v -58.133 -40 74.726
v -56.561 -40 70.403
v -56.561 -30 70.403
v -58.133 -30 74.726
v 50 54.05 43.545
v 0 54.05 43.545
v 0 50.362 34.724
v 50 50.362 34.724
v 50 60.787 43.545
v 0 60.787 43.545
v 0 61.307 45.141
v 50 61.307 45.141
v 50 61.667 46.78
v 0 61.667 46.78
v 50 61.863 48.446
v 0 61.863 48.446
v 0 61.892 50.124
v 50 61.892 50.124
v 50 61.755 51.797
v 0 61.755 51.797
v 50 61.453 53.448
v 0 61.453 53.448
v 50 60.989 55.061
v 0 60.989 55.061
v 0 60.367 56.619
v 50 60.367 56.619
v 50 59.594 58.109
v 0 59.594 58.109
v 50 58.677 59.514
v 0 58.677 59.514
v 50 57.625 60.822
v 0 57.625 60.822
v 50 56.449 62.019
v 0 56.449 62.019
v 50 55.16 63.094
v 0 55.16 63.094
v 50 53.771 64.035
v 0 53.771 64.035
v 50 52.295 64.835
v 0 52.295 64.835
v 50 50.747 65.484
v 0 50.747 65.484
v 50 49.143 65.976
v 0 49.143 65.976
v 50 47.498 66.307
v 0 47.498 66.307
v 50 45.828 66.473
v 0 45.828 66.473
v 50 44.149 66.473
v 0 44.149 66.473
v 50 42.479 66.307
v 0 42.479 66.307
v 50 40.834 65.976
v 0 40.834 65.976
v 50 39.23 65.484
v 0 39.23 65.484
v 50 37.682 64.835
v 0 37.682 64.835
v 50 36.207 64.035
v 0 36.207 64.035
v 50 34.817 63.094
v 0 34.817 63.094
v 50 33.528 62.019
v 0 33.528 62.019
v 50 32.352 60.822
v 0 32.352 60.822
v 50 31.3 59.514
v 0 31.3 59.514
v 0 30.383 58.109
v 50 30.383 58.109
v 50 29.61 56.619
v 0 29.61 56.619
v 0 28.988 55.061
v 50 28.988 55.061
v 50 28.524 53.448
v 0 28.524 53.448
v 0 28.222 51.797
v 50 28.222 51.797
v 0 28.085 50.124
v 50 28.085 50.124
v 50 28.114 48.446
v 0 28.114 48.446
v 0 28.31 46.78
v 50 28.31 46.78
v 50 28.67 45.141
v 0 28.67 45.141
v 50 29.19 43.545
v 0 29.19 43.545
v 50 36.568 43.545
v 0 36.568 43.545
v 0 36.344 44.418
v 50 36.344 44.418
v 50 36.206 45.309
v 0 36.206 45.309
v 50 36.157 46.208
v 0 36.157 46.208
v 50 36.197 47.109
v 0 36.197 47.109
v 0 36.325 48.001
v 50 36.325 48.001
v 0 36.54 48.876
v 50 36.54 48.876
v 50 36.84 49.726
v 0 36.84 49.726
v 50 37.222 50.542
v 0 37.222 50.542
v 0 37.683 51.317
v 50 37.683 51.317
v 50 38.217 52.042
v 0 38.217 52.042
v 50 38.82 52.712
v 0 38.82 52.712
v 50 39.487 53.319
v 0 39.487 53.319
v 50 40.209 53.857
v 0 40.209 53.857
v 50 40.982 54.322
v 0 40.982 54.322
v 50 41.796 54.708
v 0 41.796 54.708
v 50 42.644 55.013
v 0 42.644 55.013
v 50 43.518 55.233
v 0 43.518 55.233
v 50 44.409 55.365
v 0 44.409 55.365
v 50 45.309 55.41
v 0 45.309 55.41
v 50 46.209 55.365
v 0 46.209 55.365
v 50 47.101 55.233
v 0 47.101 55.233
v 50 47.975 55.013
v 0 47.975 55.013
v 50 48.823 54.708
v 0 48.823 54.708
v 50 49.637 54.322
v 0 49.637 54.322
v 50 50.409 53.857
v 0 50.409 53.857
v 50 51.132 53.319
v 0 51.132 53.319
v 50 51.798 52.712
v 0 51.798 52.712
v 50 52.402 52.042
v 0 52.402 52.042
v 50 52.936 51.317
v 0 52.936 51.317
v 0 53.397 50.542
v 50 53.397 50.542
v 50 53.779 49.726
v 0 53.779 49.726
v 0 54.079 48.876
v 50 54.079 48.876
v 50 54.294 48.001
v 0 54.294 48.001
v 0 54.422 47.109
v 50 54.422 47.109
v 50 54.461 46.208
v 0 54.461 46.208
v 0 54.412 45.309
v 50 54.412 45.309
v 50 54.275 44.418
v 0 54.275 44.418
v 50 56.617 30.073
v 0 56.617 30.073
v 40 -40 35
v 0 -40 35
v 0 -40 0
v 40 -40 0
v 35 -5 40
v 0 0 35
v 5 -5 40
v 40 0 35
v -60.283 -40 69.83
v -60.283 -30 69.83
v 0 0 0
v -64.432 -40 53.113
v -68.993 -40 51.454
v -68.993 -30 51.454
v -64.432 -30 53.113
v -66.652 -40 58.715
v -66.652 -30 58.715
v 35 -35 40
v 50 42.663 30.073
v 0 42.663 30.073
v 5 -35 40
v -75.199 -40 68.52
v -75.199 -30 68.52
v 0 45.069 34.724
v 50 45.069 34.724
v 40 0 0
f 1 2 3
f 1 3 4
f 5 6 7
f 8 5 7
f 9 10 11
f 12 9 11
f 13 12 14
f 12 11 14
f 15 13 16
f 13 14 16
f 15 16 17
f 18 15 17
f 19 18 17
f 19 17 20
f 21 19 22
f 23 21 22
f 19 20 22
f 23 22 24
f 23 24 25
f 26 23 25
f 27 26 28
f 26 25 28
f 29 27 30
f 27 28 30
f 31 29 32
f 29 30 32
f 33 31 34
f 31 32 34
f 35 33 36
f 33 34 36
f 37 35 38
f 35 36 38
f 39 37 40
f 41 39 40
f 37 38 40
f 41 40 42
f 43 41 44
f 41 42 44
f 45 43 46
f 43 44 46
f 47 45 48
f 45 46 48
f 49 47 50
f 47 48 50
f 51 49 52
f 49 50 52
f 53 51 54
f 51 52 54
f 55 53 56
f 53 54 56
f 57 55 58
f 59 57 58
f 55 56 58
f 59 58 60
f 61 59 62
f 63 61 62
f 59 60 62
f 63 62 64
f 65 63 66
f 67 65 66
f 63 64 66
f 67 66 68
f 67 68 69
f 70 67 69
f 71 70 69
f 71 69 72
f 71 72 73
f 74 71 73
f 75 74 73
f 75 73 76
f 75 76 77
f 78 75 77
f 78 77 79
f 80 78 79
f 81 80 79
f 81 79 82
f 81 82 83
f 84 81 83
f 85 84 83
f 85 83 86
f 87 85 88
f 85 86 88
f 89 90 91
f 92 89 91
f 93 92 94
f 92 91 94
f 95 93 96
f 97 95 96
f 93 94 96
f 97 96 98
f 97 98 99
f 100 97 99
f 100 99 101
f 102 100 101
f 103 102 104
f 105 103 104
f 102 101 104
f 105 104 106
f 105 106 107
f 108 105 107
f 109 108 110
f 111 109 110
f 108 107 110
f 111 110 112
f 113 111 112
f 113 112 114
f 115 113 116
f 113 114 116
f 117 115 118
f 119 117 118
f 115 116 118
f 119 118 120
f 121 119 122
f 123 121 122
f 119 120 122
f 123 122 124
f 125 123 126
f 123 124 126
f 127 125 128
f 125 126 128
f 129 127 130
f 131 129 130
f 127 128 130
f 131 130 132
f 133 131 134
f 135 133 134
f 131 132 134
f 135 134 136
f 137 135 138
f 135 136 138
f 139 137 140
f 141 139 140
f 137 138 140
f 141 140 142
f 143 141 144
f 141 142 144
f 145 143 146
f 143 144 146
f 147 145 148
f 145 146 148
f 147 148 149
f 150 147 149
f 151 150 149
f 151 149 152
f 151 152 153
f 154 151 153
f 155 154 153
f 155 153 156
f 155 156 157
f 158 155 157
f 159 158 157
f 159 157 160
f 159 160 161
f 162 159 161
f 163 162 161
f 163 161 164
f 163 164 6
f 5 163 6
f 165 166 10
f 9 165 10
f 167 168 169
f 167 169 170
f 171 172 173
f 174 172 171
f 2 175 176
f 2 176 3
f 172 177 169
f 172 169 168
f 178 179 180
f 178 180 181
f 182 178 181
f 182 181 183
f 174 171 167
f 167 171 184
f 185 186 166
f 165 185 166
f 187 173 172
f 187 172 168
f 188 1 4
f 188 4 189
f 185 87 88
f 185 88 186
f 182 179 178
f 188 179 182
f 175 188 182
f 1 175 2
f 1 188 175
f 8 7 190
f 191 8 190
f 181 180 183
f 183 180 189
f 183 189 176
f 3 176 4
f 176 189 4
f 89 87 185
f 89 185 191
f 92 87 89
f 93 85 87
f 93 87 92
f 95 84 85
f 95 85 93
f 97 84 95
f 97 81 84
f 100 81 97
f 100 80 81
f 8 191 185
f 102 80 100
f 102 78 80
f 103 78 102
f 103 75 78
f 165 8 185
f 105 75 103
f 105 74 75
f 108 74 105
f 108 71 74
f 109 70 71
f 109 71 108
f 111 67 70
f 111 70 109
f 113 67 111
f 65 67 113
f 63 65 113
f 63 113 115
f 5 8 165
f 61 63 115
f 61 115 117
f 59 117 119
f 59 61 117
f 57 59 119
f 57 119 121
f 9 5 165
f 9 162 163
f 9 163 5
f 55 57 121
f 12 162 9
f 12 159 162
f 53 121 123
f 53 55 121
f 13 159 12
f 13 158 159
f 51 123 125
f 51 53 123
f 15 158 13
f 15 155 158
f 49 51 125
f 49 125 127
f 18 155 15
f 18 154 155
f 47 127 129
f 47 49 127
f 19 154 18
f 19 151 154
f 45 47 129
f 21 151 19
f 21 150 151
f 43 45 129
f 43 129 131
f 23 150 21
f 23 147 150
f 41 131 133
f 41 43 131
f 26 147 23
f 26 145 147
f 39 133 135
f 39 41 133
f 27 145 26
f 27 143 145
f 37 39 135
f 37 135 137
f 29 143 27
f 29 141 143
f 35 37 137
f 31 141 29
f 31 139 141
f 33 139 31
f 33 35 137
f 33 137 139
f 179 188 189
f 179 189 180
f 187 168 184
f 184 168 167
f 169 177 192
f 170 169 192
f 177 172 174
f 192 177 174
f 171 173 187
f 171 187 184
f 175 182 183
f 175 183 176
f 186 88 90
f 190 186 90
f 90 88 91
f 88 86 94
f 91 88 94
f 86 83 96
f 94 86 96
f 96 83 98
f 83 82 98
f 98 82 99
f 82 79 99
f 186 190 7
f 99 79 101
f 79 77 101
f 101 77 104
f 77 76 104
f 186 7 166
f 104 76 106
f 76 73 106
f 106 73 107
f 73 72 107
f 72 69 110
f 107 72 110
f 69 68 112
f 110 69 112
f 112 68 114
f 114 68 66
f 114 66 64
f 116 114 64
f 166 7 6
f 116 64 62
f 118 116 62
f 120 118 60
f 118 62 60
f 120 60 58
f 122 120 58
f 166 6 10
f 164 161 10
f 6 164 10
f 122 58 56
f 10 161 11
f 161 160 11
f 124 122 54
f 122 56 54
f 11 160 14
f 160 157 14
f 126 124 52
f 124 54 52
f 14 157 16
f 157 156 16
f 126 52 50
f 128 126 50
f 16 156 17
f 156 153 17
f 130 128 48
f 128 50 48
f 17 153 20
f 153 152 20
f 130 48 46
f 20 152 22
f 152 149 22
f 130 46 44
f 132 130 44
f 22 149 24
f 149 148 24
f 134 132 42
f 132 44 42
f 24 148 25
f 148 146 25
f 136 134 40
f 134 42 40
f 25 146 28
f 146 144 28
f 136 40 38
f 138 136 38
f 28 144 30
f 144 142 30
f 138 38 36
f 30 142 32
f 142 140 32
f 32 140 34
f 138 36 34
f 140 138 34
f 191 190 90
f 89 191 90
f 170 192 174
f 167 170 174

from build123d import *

# Parameters (mm, degrees)
F0_W     = 40
F0_H     = 40
F1_DEPTH = 40
F3_DEPTH = 10
F5_DEPTH = 50
F6_SIZE  = 5


with BuildPart() as f1:
    # F0 (on Front) → F1 (new body)
    with BuildSketch(Plane.XZ):
        with Locations((20, 20)):
            Rectangle(F0_W, F0_H)
    extrude(amount=F1_DEPTH)

    # F6
    f6_edges = [f1.edges().sort_by_distance(p)[0] for p in [
        (40, -20, 40),
        (0, -20, 40),
        (20, 0, 40),
        (20, -40, 40),
    ]]
    chamfer(f6_edges, length=F6_SIZE)


with BuildPart() as f3:
    # F2 (on face) → F3 (new body)
    with BuildSketch(Plane.XZ.offset(40)):
        Polygon((-68.993416, 51.453922), (-64.431734, 53.112716), (-66.651583, 58.714803), (-60.282885, 69.82958), (-56.561089, 70.403017), (-58.133099, 74.726041), (-75.199317, 68.52014), align=None)
    extrude(amount=-F3_DEPTH)


with BuildPart() as f5:
    # F4 (on Right) → F5 (new body)
    with BuildSketch(Plane.YZ):
        with BuildLine():
            Line((54.050408, 43.545064), (60.786664, 43.545064))
            ThreePointArc((60.786664, 43.545064), (44.988547, 66.494268), (29.190429, 43.545064))
            Line((29.190429, 43.545064), (36.568228, 43.545064))
            ThreePointArc((36.568228, 43.545064), (45.309318, 55.409585), (54.050408, 43.545064))
        make_face()
        Polygon((56.616601, 30.072557), (60.786664, 43.545064), (54.050408, 43.545064), (50.361507, 34.723781), (45.068741, 34.723781), (36.568228, 43.545064), (29.190429, 43.545064), (42.662933, 30.072557), align=None)
    extrude(amount=F5_DEPTH)


solid = Compound([f1.part, f3.part, f5.part])
